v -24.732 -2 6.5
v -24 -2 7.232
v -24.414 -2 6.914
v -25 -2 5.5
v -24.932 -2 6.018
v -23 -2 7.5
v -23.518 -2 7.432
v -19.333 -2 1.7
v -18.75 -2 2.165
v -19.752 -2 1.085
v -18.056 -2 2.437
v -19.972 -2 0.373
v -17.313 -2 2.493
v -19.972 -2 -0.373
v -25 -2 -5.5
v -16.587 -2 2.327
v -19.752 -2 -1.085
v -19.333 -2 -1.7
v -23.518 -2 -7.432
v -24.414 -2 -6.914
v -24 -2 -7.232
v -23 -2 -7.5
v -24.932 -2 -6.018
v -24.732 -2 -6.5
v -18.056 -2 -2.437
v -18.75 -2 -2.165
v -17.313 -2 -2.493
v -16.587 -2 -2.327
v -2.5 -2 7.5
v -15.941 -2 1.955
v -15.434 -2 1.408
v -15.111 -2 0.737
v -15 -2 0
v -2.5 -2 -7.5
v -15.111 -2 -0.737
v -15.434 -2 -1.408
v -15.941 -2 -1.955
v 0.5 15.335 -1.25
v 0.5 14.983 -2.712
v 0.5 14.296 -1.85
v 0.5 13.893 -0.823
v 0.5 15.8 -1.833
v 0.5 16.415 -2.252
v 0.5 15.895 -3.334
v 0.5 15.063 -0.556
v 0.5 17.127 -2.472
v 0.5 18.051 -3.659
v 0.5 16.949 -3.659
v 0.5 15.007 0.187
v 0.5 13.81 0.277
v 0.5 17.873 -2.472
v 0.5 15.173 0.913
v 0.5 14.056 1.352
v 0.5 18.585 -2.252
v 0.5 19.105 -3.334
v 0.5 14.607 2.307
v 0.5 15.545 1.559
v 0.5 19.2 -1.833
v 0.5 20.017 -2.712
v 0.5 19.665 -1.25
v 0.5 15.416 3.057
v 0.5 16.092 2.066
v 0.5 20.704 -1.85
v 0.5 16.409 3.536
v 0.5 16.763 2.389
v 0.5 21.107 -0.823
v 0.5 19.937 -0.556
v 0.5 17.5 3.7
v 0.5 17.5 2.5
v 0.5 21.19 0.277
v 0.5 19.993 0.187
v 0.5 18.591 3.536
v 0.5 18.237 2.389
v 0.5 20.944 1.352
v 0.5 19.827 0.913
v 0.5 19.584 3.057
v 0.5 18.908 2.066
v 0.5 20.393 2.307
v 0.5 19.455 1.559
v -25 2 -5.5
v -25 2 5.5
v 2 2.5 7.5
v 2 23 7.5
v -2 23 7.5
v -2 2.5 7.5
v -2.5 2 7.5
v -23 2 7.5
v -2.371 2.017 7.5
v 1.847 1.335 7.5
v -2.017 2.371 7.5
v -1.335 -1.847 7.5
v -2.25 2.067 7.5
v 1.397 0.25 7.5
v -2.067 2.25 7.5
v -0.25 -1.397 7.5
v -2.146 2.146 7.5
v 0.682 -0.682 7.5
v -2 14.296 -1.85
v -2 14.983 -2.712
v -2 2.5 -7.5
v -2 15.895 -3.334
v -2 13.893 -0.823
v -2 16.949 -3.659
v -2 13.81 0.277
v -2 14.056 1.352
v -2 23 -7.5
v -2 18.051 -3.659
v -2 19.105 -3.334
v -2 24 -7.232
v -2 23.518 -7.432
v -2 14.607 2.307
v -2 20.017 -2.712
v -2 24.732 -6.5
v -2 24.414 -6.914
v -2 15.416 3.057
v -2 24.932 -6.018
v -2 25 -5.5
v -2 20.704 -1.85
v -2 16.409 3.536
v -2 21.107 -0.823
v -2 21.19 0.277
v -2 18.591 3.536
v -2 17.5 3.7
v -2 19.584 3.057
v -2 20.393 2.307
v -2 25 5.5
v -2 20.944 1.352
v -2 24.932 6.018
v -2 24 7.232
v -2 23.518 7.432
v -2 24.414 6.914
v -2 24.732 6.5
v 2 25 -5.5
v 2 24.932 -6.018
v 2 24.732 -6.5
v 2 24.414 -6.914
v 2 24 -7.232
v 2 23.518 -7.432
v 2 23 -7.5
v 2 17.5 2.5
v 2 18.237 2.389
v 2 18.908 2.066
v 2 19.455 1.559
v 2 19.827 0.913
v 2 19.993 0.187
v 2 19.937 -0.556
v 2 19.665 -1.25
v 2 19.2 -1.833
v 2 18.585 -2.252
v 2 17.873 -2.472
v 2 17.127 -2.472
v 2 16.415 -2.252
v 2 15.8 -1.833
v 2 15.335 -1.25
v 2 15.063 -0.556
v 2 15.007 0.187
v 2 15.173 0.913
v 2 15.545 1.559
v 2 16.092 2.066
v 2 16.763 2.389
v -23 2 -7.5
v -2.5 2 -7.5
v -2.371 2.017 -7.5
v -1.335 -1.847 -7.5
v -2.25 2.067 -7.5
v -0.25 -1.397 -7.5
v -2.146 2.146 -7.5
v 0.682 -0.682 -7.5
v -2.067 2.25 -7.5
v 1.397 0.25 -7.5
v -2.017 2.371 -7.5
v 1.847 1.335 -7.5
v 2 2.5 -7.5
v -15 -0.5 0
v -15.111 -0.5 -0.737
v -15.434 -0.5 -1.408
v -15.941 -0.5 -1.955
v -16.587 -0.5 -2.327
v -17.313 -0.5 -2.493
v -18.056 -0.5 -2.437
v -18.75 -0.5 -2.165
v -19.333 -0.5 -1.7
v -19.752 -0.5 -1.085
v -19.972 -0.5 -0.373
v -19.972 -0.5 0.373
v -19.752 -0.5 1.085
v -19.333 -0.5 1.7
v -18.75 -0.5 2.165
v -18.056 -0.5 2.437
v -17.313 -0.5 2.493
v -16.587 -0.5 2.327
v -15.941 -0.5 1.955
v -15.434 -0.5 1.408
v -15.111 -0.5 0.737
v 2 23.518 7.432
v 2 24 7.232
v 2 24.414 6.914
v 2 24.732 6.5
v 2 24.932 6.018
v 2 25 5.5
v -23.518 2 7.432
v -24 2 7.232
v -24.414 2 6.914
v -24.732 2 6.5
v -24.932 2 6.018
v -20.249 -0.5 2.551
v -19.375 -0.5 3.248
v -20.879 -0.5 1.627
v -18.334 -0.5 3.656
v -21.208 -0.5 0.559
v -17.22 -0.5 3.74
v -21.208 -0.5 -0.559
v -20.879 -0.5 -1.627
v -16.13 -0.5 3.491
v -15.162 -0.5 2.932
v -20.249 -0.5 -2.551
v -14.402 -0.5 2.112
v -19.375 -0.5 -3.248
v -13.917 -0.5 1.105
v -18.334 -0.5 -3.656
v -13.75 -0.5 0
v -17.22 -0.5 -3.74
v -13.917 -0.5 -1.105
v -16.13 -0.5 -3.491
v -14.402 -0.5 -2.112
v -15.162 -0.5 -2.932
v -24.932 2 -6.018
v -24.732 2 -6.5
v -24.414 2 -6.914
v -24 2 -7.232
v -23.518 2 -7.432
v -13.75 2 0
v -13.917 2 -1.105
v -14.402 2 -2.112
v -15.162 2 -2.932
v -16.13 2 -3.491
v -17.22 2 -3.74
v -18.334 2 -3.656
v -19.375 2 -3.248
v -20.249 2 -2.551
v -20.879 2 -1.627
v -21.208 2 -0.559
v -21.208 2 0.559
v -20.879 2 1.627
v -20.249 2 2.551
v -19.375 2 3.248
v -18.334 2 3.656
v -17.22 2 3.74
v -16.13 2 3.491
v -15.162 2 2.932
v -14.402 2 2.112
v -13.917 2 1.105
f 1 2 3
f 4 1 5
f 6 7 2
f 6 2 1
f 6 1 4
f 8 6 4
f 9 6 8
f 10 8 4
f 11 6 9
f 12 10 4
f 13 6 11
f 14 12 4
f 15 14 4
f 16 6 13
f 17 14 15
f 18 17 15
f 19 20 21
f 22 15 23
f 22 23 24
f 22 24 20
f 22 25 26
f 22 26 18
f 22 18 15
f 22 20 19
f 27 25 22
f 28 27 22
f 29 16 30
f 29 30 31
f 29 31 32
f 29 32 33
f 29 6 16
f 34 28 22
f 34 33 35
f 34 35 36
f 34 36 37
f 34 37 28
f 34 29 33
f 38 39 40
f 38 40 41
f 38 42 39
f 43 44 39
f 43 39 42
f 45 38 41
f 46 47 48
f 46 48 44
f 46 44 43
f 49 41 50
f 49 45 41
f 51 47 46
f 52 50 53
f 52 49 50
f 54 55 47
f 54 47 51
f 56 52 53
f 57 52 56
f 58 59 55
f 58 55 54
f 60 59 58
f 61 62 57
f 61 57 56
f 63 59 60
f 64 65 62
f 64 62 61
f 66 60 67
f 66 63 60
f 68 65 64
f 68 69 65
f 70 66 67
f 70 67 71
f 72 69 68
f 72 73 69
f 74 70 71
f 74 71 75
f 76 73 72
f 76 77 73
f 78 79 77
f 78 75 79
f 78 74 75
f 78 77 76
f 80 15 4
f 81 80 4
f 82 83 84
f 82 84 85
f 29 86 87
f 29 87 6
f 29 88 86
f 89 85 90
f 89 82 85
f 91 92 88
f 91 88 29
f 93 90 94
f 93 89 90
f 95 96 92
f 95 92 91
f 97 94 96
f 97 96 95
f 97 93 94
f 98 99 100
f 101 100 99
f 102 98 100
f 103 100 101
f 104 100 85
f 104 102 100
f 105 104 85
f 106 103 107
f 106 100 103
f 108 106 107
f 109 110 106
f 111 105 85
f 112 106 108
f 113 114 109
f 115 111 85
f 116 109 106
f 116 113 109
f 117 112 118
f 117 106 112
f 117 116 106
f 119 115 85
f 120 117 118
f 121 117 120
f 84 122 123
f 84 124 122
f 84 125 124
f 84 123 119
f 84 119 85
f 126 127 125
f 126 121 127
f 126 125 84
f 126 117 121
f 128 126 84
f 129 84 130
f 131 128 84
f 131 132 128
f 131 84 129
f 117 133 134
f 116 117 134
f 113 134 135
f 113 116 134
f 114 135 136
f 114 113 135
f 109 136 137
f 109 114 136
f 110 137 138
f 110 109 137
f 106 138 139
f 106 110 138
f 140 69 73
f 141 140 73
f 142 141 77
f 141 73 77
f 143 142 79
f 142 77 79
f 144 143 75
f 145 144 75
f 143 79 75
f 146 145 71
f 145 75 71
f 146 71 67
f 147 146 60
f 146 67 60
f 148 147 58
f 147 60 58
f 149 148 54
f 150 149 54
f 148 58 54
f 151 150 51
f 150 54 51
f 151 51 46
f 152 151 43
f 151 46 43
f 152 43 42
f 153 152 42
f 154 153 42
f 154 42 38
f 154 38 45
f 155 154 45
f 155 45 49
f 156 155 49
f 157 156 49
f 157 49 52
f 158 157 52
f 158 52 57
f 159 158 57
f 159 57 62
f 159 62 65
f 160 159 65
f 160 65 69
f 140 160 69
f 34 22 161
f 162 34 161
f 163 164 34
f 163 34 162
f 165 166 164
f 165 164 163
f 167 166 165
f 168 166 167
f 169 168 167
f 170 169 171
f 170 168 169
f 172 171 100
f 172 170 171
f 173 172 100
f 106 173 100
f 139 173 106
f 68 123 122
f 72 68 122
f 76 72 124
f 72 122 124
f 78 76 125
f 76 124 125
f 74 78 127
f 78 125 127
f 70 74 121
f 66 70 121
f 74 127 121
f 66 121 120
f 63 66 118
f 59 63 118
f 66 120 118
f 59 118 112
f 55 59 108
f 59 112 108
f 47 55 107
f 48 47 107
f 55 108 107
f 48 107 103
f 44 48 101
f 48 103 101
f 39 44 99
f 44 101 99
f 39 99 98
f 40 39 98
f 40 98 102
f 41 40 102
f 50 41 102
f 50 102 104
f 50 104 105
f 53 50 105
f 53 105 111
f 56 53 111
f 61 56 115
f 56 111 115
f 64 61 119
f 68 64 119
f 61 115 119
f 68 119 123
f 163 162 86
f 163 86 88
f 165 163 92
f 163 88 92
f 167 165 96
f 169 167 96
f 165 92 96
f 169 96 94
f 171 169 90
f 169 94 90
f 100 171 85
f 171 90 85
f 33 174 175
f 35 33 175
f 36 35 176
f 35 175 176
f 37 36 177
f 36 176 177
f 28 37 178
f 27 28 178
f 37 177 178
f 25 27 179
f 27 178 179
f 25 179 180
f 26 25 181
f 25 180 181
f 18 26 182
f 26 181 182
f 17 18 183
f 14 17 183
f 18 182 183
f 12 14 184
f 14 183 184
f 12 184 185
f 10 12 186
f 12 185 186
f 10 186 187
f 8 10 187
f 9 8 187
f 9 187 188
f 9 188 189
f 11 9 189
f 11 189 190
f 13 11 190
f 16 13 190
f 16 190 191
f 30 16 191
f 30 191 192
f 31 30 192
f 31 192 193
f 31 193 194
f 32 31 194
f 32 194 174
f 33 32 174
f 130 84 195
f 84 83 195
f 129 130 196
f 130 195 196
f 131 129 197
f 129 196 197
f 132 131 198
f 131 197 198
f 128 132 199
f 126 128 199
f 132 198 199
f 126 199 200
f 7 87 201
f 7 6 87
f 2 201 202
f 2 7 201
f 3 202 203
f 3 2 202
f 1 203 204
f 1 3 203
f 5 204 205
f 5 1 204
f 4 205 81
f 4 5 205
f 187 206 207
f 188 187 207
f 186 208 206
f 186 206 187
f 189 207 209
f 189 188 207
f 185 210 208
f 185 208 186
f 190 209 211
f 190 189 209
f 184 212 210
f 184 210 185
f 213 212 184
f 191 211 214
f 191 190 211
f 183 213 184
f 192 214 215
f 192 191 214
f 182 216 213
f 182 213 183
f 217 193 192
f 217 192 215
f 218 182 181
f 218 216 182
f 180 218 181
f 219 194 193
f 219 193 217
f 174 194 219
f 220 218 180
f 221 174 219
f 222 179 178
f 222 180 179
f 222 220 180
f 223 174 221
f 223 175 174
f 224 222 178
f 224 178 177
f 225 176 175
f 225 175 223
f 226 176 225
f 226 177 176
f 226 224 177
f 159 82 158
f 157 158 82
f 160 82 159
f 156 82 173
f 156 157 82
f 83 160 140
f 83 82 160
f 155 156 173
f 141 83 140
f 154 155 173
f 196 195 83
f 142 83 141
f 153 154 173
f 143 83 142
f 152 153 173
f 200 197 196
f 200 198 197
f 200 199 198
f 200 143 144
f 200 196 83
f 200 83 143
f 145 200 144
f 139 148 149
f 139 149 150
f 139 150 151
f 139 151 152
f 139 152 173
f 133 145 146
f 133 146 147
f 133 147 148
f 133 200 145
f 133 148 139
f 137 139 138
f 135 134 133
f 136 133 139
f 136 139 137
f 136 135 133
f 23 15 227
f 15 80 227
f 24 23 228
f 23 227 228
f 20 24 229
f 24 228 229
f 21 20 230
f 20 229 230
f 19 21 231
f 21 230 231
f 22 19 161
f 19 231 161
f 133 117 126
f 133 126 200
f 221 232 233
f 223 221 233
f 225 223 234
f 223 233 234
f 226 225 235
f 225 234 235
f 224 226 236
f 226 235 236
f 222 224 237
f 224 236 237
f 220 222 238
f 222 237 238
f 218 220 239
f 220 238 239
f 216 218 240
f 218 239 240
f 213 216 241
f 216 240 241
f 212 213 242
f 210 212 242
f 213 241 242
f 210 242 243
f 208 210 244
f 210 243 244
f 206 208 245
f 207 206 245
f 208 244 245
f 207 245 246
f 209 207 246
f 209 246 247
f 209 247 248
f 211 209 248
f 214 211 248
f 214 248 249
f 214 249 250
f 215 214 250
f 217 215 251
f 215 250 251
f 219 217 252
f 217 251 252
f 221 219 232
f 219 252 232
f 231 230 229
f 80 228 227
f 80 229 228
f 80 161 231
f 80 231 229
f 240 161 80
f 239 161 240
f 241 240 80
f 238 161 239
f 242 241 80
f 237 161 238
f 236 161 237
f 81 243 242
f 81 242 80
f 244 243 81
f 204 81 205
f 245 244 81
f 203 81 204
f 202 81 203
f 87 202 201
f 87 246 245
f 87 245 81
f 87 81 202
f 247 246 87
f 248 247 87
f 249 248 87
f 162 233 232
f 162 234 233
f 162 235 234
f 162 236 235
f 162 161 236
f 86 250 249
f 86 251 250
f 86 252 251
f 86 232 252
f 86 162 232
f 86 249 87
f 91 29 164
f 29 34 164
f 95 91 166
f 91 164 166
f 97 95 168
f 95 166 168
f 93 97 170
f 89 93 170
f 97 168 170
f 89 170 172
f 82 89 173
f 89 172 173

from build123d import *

# Parameters (mm, degrees)
SKETCH5_W          = 15
SKETCH5_H          = 4
SKETCH7_R          = 2.5
CUT_EXTRUDE2_DEPTH = 5
FILLET1_R          = 2
SKETCH9_R          = 3.7
CUT_EXTRUDE3_DEPTH = 2.5
SKETCH6_R          = 2.5
CUT_EXTRUDE4_DEPTH = 5
SKETCH10_R         = 3.75
CUT_EXTRUDE5_DEPTH = 2.5


with BuildPart() as part:
    # Sweep1: sweep along a path in Sketch2
    with BuildLine(Plane.XY) as sweep1_path:
        Line((-25, 0), (-2.5, 0))
        ThreePointArc((-2.5, 0), (-0.732233047, 0.732233047), (0, 2.5))
        Line((0, 2.5), (0, 25))
    # Sketch5 → Sweep1 (sweep)
    with BuildSketch(Plane(origin=(-25, 0, 0), x_dir=(0, 0, -1), z_dir=(1, 0, 0))):
        Rectangle(SKETCH5_W, SKETCH5_H)
    sweep(path=sweep1_path.line)

    # Sketch7 → Cut-Extrude2 (cut, through all)
    with BuildSketch(Plane.ZY.offset(2)):
        with Locations((0, 17.5)):
            Circle(SKETCH7_R)
    extrude(amount=-CUT_EXTRUDE2_DEPTH, mode=Mode.SUBTRACT)

    # Fillet1
    fillet1_edges = [part.edges().sort_by_distance(p)[0] for p in [
        (-25, 0, 7.5),
        (0, 25, -7.5),
        (0, 25, 7.5),
        (-25, 0, -7.5),
    ]]
    fillet(fillet1_edges, radius=FILLET1_R)

    # Sketch9 → Cut-Extrude3 (cut)
    with BuildSketch(Plane.ZY.offset(2)):
        with Locations((0, 17.5)):
            Circle(SKETCH9_R)
    extrude(amount=-CUT_EXTRUDE3_DEPTH, mode=Mode.SUBTRACT)

    # Sketch6 → Cut-Extrude4 (cut, through all)
    with BuildSketch(Plane(origin=(0, 2, 0), x_dir=(1, 0, 0), z_dir=(0, 1, 0))):
        with Locations((-17.5, 0)):
            Circle(SKETCH6_R)
    extrude(amount=-CUT_EXTRUDE4_DEPTH, mode=Mode.SUBTRACT)

    # Sketch10 → Cut-Extrude5 (cut)
    with BuildSketch(Plane(origin=(0, 2, 0), x_dir=(1, 0, 0), z_dir=(0, 1, 0))):
        with Locations((-17.5, 0)):
            Circle(SKETCH10_R)
    extrude(amount=-CUT_EXTRUDE5_DEPTH, mode=Mode.SUBTRACT)


solid = part.part
